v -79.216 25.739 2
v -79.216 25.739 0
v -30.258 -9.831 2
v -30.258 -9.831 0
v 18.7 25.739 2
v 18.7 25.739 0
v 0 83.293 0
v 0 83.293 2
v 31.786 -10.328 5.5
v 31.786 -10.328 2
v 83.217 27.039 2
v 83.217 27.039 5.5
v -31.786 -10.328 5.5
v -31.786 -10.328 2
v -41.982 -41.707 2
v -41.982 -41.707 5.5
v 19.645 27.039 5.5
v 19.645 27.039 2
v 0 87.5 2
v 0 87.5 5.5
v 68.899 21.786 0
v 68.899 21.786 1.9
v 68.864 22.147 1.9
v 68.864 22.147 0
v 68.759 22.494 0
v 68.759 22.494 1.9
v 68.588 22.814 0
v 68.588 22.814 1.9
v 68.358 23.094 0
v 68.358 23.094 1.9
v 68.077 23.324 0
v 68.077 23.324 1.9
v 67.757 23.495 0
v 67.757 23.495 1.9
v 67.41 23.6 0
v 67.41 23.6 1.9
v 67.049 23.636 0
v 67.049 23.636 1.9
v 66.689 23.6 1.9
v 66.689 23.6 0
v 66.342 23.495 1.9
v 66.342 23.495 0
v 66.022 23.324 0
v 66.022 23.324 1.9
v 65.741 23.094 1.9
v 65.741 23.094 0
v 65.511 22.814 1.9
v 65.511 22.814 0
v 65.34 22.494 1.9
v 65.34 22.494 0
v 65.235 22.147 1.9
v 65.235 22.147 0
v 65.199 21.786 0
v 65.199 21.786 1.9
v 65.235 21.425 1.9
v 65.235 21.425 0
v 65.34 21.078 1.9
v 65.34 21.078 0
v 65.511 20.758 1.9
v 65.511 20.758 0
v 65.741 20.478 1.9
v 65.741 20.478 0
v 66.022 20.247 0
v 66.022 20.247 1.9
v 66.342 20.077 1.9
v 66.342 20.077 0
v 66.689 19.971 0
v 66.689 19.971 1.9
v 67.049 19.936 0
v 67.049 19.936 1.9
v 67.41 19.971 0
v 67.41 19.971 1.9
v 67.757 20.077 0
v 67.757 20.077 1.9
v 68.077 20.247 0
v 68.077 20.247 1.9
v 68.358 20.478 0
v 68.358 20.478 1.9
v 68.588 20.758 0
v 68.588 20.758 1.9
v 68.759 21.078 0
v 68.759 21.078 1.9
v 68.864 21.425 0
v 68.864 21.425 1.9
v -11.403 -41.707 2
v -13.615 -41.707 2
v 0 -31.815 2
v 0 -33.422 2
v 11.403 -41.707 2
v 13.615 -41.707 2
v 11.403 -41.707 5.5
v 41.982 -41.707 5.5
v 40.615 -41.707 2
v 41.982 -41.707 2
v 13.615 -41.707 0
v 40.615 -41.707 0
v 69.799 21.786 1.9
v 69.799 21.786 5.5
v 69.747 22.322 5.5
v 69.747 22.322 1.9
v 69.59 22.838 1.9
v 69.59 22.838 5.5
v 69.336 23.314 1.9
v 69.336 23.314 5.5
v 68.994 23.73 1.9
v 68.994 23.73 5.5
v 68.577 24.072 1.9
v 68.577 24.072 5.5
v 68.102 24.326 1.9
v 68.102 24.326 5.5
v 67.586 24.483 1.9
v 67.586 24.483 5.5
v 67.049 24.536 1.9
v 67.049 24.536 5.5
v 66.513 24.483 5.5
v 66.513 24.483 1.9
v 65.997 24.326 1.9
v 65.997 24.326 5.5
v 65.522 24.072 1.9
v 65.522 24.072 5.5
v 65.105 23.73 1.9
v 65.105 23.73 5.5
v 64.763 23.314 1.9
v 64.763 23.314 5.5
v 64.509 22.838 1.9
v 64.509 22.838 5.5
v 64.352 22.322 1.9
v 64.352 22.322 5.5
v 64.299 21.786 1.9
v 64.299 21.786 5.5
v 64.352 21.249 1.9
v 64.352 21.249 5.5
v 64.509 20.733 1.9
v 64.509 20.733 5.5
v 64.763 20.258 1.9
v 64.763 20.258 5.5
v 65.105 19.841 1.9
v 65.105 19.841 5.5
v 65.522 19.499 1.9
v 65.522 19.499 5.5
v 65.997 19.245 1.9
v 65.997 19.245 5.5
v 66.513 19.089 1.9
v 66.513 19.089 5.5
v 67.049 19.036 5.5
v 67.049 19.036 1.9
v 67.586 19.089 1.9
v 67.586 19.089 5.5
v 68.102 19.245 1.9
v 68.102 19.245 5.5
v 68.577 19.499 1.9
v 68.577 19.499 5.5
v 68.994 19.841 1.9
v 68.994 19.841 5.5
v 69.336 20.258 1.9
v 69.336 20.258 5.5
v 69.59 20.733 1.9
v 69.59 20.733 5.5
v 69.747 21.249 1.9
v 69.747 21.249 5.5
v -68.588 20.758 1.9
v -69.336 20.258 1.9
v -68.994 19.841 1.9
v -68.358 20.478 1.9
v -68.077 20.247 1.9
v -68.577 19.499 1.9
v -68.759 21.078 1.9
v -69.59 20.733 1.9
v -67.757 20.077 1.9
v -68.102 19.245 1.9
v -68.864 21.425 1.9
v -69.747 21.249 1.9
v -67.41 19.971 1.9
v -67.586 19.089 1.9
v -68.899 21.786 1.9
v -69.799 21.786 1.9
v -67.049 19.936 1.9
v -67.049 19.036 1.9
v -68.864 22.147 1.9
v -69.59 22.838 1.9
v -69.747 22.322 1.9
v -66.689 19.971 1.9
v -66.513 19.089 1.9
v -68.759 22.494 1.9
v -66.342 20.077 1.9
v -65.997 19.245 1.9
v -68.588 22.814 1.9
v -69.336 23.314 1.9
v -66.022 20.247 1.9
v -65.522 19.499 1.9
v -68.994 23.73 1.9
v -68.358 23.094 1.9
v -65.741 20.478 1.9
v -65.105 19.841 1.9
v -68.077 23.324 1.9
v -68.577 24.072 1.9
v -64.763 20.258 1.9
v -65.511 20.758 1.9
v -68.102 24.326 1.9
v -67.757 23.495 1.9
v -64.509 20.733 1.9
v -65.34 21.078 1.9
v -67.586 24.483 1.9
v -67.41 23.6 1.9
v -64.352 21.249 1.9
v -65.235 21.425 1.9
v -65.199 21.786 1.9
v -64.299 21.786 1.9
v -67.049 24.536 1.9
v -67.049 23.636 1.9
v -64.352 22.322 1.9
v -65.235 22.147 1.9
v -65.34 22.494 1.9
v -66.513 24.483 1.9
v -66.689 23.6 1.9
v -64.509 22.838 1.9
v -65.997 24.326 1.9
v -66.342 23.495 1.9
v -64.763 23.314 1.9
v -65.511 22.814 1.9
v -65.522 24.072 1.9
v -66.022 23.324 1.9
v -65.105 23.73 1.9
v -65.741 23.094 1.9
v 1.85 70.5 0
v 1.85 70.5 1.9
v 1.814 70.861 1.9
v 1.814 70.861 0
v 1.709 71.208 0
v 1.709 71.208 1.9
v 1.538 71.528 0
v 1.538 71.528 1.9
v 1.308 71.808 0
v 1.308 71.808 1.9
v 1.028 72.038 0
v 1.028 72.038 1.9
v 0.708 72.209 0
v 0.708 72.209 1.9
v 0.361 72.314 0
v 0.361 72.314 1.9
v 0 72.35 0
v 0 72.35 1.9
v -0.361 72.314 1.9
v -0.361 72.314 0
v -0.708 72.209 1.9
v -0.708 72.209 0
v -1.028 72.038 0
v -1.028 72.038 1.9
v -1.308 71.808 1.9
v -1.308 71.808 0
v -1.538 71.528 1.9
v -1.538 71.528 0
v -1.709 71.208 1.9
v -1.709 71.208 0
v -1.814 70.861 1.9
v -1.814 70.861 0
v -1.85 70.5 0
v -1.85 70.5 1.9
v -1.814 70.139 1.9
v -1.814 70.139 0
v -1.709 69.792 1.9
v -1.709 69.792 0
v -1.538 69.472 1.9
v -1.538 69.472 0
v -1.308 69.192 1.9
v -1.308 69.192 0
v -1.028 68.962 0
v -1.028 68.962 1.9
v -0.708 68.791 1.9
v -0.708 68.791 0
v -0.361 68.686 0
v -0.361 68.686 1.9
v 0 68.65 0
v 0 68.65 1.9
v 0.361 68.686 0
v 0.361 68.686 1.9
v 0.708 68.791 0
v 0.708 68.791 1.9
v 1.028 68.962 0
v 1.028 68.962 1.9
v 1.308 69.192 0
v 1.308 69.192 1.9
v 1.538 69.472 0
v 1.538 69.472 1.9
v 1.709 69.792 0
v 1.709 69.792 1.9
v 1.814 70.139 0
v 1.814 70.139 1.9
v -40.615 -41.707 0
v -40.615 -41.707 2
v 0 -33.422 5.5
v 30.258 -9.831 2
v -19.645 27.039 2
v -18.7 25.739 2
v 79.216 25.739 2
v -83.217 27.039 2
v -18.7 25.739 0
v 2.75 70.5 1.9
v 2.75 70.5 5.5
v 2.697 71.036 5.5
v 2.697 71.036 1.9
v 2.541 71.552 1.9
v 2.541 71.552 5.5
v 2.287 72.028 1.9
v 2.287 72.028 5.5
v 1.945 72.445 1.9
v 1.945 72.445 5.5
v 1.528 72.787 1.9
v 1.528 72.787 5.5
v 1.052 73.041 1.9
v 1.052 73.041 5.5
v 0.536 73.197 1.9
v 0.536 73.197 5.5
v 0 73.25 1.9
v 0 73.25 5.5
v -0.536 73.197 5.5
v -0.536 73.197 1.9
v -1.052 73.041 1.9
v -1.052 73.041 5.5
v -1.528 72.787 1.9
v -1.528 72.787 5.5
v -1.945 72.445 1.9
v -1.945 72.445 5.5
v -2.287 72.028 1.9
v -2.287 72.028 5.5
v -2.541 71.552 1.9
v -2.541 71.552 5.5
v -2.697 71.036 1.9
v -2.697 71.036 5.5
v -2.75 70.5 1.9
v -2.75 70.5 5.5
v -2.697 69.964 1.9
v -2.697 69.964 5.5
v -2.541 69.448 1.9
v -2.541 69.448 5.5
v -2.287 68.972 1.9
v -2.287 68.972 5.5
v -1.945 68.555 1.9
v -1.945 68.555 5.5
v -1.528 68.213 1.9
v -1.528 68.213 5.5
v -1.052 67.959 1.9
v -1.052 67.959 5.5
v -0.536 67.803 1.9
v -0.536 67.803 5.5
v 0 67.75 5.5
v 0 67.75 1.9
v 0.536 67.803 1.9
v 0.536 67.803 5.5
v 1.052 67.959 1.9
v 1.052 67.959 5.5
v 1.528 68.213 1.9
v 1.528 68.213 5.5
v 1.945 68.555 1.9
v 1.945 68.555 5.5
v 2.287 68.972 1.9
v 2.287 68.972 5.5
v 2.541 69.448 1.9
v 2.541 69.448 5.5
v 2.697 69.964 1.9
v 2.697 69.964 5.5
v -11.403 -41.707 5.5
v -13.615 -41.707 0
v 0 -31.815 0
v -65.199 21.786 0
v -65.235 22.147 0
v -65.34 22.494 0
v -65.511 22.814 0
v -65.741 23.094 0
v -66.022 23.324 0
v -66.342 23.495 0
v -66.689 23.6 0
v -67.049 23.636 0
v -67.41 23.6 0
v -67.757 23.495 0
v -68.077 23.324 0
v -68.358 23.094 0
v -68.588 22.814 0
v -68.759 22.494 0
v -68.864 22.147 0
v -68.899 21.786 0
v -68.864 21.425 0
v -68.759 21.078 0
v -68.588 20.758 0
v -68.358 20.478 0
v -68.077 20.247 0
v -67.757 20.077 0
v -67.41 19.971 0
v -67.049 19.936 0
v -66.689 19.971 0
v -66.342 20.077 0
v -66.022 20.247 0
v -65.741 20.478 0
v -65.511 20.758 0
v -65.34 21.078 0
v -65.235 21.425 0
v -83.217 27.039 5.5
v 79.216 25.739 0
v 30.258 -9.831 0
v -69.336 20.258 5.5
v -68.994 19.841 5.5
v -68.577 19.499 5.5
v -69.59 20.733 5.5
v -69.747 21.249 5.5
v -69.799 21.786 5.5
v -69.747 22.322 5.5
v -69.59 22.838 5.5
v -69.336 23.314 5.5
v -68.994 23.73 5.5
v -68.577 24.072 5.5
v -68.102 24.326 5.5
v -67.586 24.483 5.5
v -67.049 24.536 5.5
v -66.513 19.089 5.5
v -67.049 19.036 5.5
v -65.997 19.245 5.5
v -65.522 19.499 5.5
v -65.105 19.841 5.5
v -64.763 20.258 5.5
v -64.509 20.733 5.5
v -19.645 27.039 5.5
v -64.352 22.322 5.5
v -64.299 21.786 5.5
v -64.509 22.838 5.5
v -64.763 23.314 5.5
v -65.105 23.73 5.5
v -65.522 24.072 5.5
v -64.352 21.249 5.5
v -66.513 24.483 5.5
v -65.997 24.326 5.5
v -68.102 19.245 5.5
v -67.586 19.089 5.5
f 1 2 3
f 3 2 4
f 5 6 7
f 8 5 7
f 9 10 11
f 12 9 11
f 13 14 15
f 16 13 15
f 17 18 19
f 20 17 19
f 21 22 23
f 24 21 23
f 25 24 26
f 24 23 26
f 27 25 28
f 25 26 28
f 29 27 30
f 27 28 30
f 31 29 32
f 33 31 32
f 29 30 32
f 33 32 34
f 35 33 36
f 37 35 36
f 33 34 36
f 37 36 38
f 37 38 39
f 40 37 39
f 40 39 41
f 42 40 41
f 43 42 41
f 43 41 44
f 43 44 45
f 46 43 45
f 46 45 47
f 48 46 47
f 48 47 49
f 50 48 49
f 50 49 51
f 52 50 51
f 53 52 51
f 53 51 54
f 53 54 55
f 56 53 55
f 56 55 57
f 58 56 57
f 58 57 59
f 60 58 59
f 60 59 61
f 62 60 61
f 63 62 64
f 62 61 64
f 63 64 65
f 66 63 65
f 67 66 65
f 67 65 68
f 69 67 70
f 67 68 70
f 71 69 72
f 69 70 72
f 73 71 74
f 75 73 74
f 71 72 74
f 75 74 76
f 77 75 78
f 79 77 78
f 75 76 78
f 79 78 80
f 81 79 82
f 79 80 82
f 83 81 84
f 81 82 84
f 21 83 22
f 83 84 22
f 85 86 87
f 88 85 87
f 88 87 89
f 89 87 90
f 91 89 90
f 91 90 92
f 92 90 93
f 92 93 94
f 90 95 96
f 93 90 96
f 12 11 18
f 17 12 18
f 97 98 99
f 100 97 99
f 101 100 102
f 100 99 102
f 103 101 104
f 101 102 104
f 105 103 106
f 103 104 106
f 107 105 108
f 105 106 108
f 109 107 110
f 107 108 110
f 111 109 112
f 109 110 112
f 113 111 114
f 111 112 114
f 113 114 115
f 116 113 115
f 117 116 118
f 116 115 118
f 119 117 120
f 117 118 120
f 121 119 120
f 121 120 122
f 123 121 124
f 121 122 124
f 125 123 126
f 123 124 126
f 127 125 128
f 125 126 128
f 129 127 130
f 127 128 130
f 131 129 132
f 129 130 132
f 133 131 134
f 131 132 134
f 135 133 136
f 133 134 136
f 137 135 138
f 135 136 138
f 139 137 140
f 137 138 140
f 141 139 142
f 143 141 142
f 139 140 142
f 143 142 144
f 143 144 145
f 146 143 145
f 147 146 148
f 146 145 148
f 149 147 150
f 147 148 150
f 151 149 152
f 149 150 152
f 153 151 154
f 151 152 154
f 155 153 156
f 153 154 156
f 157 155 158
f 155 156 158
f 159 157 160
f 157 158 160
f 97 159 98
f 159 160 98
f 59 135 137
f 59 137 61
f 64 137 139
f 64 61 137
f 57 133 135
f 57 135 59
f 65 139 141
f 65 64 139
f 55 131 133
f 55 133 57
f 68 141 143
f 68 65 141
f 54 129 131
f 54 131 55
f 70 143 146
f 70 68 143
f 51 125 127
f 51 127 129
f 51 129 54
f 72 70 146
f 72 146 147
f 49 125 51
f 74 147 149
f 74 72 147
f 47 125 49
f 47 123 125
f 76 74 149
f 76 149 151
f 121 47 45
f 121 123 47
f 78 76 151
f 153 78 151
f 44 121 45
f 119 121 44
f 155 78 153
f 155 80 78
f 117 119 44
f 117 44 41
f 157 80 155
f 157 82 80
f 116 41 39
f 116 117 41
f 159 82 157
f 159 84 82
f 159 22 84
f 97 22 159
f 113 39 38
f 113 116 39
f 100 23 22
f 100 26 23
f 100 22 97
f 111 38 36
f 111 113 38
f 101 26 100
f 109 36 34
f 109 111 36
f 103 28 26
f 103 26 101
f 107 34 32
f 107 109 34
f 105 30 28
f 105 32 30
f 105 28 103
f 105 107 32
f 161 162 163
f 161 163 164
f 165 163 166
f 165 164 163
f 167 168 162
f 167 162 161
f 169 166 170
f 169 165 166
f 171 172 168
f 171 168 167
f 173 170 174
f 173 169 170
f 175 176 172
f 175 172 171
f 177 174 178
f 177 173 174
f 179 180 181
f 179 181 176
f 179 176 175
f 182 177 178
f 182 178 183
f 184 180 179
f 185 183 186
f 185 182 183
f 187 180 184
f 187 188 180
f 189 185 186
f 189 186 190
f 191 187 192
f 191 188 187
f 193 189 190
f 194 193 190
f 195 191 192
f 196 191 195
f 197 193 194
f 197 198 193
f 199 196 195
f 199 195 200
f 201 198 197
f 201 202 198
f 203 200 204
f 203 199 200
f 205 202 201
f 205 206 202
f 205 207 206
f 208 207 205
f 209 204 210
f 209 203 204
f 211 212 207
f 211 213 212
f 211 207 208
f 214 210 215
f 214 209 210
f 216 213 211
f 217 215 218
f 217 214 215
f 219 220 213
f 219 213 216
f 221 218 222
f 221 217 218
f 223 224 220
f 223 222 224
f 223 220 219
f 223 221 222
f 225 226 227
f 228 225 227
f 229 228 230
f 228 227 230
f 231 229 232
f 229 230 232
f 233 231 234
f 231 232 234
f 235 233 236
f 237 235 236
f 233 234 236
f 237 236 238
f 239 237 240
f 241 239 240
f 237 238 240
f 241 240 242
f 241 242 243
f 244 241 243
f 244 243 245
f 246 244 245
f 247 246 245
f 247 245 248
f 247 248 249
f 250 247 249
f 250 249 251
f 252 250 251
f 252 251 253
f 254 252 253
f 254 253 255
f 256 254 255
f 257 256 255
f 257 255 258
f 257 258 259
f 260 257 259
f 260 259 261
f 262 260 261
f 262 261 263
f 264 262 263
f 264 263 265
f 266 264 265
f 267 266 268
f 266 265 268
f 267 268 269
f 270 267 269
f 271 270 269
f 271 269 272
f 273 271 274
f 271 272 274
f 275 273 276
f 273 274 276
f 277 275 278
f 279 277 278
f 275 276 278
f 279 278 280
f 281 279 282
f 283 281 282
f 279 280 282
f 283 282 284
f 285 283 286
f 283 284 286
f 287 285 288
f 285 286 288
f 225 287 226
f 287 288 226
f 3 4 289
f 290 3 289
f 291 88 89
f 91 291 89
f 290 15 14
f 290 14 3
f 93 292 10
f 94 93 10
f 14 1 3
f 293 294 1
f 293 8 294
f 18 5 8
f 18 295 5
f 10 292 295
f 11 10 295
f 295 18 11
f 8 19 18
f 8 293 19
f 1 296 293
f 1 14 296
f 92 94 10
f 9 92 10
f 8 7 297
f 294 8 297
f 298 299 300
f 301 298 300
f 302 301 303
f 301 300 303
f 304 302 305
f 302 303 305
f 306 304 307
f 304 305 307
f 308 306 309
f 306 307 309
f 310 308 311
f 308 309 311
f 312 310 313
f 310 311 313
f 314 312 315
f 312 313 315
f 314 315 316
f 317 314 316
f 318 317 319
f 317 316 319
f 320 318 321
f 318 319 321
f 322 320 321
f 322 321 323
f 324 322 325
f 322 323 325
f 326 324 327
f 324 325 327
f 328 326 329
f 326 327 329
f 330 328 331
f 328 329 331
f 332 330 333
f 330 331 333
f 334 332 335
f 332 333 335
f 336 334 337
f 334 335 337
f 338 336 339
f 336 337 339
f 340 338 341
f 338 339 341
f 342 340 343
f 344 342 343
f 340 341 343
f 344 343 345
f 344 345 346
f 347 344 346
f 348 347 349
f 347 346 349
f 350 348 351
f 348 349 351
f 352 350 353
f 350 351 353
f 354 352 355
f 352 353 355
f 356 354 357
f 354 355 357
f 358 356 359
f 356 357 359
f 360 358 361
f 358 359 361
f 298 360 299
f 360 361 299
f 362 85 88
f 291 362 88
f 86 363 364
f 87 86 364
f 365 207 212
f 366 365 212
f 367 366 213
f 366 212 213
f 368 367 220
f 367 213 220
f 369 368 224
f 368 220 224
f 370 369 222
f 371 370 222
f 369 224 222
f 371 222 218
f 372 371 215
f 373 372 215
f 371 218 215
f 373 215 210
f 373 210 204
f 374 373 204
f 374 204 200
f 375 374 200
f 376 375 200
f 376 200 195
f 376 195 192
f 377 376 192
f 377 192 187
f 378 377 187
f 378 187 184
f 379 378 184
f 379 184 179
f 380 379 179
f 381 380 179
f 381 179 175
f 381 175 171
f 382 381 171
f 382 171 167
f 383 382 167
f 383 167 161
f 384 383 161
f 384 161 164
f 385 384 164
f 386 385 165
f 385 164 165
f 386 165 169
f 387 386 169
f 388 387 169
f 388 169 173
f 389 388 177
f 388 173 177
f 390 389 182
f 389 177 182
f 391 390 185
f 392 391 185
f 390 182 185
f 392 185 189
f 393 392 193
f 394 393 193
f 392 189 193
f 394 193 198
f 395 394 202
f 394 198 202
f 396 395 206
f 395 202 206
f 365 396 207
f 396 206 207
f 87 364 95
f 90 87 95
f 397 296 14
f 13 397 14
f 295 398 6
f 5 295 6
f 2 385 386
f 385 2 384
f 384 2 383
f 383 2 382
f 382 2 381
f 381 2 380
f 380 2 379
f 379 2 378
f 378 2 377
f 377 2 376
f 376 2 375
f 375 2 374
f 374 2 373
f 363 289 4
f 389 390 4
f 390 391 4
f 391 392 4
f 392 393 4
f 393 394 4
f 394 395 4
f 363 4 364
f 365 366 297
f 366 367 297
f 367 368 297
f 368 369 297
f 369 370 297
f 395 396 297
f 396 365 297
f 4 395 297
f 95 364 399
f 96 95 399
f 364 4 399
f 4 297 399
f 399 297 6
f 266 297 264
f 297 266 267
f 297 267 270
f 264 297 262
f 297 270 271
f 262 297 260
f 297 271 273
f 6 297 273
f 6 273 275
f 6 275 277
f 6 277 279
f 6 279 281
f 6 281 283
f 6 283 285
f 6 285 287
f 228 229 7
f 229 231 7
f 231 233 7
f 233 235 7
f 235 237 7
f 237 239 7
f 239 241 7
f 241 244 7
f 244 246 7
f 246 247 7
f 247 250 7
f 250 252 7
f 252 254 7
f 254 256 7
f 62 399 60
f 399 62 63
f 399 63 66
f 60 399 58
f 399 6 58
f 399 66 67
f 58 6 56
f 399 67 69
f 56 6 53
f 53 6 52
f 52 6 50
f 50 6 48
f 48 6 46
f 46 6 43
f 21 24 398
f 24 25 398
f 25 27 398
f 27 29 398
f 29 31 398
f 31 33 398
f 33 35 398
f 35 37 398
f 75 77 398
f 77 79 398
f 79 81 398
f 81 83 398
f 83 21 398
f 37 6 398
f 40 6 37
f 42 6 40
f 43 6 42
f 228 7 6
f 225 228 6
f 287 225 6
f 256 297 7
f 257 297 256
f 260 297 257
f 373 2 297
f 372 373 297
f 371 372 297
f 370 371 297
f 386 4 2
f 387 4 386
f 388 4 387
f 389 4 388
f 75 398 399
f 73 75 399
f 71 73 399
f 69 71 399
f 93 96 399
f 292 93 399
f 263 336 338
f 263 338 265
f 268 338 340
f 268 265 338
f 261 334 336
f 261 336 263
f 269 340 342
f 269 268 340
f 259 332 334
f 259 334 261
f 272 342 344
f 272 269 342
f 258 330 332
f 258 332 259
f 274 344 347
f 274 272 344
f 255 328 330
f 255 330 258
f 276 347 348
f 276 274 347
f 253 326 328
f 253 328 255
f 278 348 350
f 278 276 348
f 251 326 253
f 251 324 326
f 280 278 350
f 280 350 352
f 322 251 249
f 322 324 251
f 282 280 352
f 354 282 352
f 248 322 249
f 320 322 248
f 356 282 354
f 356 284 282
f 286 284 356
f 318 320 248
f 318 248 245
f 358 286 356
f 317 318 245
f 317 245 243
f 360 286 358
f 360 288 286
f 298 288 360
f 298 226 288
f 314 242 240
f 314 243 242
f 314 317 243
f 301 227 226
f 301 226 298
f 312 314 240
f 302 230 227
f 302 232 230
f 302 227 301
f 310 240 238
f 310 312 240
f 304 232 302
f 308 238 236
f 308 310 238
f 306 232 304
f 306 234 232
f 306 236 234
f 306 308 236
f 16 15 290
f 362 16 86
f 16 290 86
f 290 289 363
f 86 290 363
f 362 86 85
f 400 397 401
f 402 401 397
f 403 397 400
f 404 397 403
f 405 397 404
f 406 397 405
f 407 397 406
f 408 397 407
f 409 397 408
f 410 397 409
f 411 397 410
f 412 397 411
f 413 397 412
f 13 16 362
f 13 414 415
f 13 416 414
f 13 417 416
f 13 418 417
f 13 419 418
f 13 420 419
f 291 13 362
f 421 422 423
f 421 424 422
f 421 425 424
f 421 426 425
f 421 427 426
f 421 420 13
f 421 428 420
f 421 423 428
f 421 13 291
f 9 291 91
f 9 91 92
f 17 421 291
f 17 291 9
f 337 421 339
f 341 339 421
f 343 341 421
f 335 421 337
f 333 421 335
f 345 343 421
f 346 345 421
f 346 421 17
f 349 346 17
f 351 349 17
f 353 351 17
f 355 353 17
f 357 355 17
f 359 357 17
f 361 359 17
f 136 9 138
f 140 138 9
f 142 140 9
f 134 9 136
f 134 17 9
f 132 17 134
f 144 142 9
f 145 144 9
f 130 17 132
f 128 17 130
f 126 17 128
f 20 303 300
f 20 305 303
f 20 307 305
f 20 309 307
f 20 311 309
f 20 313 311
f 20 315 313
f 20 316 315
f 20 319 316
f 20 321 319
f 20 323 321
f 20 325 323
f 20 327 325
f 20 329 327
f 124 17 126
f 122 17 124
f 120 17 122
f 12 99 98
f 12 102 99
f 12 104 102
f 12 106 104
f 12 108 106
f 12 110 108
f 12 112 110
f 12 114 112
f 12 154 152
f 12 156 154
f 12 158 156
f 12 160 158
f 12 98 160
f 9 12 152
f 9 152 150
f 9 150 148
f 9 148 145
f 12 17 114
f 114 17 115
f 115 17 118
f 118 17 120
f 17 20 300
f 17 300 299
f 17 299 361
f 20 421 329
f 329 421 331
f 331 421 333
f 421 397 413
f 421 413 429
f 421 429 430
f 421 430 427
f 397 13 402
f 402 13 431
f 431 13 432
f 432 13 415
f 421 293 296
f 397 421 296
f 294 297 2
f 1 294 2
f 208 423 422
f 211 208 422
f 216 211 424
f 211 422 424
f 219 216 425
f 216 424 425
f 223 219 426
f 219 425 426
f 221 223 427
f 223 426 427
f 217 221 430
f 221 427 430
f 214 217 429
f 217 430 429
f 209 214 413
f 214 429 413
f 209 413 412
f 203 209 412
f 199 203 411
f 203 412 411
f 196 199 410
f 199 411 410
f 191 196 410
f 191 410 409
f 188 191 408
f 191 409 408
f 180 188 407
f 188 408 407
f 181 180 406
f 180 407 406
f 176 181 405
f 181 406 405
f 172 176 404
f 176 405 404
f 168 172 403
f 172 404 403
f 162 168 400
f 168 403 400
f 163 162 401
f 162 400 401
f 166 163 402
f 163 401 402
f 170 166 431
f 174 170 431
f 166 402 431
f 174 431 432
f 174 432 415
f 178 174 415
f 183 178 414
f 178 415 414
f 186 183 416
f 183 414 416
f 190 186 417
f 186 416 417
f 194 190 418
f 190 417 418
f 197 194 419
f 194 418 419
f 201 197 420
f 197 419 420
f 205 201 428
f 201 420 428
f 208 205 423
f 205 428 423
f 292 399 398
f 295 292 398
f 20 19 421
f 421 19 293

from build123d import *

# Parameters (mm, degrees)
SALIENTE_EXTRUIR1_DEPTH = 2
SALIENTE_EXTRUIR2_DEPTH = 3.5
CROQUIS2_R              = 1.85
CORTAR_EXTRUIR4_DEPTH   = 10
CROQUIS4_R              = 2.75
CORTAR_EXTRUIR5_DEPTH   = 3.6


with BuildPart() as part:
    # Croquis1 → Saliente-Extruir1 (new body)
    with BuildSketch(Plane.XY):
        Polygon((79.216456577, 25.738987008), (18.700468689, 25.738987008), (0, 83.293111629), (-18.700468689, 25.738987008), (-79.216456577, 25.738987008), (-30.257993944, -9.831418201), (-40.615003785, -41.707016882), (-13.615003785, -41.707016882), (0, -31.815137614), (13.615003785, -41.707016882), (40.615003785, -41.707016882), (30.257993944, -9.831418201), align=None)
    extrude(amount=SALIENTE_EXTRUIR1_DEPTH)

    # Croquis3 → Saliente-Extruir2 (add)
    with BuildSketch(Plane.XY.offset(2)):
        Polygon((-41.981904677, -41.707016882), (-11.403311683, -41.707016882), (0, -33.422025984), (11.403311683, -41.707016882), (41.981904677, -41.707016882), (31.7862356, -10.327974016), (83.217445176, 27.038987008), (19.644973975, 27.038987008), (0, 87.5), (-19.644973975, 27.038987008), (-83.217445176, 27.038987008), (-31.7862356, -10.327974016), align=None)
    extrude(amount=SALIENTE_EXTRUIR2_DEPTH)

    # Croquis2 → Cortar-Extruir4 (cut)
    with BuildSketch(Plane.XY.offset(5.5)):
        with Locations((0, 70.5)):
            Circle(CROQUIS2_R)
        with Locations((67.049484399, 21.785698103)):
            Circle(CROQUIS2_R)
        with Locations((-67.049484399, 21.785698103)):
            Circle(CROQUIS2_R)
    extrude(amount=-CORTAR_EXTRUIR4_DEPTH, mode=Mode.SUBTRACT)

    # Croquis4 → Cortar-Extruir5 (cut)
    with BuildSketch(Plane.XY.offset(5.5)):
        with Locations((67.049484399, 21.785698103)):
            Circle(CROQUIS4_R)
        with Locations((0, 70.5)):
            Circle(CROQUIS4_R)
        with Locations((-67.049484399, 21.785698103)):
            Circle(CROQUIS4_R)
    extrude(amount=-CORTAR_EXTRUIR5_DEPTH, mode=Mode.SUBTRACT)


solid = part.part
